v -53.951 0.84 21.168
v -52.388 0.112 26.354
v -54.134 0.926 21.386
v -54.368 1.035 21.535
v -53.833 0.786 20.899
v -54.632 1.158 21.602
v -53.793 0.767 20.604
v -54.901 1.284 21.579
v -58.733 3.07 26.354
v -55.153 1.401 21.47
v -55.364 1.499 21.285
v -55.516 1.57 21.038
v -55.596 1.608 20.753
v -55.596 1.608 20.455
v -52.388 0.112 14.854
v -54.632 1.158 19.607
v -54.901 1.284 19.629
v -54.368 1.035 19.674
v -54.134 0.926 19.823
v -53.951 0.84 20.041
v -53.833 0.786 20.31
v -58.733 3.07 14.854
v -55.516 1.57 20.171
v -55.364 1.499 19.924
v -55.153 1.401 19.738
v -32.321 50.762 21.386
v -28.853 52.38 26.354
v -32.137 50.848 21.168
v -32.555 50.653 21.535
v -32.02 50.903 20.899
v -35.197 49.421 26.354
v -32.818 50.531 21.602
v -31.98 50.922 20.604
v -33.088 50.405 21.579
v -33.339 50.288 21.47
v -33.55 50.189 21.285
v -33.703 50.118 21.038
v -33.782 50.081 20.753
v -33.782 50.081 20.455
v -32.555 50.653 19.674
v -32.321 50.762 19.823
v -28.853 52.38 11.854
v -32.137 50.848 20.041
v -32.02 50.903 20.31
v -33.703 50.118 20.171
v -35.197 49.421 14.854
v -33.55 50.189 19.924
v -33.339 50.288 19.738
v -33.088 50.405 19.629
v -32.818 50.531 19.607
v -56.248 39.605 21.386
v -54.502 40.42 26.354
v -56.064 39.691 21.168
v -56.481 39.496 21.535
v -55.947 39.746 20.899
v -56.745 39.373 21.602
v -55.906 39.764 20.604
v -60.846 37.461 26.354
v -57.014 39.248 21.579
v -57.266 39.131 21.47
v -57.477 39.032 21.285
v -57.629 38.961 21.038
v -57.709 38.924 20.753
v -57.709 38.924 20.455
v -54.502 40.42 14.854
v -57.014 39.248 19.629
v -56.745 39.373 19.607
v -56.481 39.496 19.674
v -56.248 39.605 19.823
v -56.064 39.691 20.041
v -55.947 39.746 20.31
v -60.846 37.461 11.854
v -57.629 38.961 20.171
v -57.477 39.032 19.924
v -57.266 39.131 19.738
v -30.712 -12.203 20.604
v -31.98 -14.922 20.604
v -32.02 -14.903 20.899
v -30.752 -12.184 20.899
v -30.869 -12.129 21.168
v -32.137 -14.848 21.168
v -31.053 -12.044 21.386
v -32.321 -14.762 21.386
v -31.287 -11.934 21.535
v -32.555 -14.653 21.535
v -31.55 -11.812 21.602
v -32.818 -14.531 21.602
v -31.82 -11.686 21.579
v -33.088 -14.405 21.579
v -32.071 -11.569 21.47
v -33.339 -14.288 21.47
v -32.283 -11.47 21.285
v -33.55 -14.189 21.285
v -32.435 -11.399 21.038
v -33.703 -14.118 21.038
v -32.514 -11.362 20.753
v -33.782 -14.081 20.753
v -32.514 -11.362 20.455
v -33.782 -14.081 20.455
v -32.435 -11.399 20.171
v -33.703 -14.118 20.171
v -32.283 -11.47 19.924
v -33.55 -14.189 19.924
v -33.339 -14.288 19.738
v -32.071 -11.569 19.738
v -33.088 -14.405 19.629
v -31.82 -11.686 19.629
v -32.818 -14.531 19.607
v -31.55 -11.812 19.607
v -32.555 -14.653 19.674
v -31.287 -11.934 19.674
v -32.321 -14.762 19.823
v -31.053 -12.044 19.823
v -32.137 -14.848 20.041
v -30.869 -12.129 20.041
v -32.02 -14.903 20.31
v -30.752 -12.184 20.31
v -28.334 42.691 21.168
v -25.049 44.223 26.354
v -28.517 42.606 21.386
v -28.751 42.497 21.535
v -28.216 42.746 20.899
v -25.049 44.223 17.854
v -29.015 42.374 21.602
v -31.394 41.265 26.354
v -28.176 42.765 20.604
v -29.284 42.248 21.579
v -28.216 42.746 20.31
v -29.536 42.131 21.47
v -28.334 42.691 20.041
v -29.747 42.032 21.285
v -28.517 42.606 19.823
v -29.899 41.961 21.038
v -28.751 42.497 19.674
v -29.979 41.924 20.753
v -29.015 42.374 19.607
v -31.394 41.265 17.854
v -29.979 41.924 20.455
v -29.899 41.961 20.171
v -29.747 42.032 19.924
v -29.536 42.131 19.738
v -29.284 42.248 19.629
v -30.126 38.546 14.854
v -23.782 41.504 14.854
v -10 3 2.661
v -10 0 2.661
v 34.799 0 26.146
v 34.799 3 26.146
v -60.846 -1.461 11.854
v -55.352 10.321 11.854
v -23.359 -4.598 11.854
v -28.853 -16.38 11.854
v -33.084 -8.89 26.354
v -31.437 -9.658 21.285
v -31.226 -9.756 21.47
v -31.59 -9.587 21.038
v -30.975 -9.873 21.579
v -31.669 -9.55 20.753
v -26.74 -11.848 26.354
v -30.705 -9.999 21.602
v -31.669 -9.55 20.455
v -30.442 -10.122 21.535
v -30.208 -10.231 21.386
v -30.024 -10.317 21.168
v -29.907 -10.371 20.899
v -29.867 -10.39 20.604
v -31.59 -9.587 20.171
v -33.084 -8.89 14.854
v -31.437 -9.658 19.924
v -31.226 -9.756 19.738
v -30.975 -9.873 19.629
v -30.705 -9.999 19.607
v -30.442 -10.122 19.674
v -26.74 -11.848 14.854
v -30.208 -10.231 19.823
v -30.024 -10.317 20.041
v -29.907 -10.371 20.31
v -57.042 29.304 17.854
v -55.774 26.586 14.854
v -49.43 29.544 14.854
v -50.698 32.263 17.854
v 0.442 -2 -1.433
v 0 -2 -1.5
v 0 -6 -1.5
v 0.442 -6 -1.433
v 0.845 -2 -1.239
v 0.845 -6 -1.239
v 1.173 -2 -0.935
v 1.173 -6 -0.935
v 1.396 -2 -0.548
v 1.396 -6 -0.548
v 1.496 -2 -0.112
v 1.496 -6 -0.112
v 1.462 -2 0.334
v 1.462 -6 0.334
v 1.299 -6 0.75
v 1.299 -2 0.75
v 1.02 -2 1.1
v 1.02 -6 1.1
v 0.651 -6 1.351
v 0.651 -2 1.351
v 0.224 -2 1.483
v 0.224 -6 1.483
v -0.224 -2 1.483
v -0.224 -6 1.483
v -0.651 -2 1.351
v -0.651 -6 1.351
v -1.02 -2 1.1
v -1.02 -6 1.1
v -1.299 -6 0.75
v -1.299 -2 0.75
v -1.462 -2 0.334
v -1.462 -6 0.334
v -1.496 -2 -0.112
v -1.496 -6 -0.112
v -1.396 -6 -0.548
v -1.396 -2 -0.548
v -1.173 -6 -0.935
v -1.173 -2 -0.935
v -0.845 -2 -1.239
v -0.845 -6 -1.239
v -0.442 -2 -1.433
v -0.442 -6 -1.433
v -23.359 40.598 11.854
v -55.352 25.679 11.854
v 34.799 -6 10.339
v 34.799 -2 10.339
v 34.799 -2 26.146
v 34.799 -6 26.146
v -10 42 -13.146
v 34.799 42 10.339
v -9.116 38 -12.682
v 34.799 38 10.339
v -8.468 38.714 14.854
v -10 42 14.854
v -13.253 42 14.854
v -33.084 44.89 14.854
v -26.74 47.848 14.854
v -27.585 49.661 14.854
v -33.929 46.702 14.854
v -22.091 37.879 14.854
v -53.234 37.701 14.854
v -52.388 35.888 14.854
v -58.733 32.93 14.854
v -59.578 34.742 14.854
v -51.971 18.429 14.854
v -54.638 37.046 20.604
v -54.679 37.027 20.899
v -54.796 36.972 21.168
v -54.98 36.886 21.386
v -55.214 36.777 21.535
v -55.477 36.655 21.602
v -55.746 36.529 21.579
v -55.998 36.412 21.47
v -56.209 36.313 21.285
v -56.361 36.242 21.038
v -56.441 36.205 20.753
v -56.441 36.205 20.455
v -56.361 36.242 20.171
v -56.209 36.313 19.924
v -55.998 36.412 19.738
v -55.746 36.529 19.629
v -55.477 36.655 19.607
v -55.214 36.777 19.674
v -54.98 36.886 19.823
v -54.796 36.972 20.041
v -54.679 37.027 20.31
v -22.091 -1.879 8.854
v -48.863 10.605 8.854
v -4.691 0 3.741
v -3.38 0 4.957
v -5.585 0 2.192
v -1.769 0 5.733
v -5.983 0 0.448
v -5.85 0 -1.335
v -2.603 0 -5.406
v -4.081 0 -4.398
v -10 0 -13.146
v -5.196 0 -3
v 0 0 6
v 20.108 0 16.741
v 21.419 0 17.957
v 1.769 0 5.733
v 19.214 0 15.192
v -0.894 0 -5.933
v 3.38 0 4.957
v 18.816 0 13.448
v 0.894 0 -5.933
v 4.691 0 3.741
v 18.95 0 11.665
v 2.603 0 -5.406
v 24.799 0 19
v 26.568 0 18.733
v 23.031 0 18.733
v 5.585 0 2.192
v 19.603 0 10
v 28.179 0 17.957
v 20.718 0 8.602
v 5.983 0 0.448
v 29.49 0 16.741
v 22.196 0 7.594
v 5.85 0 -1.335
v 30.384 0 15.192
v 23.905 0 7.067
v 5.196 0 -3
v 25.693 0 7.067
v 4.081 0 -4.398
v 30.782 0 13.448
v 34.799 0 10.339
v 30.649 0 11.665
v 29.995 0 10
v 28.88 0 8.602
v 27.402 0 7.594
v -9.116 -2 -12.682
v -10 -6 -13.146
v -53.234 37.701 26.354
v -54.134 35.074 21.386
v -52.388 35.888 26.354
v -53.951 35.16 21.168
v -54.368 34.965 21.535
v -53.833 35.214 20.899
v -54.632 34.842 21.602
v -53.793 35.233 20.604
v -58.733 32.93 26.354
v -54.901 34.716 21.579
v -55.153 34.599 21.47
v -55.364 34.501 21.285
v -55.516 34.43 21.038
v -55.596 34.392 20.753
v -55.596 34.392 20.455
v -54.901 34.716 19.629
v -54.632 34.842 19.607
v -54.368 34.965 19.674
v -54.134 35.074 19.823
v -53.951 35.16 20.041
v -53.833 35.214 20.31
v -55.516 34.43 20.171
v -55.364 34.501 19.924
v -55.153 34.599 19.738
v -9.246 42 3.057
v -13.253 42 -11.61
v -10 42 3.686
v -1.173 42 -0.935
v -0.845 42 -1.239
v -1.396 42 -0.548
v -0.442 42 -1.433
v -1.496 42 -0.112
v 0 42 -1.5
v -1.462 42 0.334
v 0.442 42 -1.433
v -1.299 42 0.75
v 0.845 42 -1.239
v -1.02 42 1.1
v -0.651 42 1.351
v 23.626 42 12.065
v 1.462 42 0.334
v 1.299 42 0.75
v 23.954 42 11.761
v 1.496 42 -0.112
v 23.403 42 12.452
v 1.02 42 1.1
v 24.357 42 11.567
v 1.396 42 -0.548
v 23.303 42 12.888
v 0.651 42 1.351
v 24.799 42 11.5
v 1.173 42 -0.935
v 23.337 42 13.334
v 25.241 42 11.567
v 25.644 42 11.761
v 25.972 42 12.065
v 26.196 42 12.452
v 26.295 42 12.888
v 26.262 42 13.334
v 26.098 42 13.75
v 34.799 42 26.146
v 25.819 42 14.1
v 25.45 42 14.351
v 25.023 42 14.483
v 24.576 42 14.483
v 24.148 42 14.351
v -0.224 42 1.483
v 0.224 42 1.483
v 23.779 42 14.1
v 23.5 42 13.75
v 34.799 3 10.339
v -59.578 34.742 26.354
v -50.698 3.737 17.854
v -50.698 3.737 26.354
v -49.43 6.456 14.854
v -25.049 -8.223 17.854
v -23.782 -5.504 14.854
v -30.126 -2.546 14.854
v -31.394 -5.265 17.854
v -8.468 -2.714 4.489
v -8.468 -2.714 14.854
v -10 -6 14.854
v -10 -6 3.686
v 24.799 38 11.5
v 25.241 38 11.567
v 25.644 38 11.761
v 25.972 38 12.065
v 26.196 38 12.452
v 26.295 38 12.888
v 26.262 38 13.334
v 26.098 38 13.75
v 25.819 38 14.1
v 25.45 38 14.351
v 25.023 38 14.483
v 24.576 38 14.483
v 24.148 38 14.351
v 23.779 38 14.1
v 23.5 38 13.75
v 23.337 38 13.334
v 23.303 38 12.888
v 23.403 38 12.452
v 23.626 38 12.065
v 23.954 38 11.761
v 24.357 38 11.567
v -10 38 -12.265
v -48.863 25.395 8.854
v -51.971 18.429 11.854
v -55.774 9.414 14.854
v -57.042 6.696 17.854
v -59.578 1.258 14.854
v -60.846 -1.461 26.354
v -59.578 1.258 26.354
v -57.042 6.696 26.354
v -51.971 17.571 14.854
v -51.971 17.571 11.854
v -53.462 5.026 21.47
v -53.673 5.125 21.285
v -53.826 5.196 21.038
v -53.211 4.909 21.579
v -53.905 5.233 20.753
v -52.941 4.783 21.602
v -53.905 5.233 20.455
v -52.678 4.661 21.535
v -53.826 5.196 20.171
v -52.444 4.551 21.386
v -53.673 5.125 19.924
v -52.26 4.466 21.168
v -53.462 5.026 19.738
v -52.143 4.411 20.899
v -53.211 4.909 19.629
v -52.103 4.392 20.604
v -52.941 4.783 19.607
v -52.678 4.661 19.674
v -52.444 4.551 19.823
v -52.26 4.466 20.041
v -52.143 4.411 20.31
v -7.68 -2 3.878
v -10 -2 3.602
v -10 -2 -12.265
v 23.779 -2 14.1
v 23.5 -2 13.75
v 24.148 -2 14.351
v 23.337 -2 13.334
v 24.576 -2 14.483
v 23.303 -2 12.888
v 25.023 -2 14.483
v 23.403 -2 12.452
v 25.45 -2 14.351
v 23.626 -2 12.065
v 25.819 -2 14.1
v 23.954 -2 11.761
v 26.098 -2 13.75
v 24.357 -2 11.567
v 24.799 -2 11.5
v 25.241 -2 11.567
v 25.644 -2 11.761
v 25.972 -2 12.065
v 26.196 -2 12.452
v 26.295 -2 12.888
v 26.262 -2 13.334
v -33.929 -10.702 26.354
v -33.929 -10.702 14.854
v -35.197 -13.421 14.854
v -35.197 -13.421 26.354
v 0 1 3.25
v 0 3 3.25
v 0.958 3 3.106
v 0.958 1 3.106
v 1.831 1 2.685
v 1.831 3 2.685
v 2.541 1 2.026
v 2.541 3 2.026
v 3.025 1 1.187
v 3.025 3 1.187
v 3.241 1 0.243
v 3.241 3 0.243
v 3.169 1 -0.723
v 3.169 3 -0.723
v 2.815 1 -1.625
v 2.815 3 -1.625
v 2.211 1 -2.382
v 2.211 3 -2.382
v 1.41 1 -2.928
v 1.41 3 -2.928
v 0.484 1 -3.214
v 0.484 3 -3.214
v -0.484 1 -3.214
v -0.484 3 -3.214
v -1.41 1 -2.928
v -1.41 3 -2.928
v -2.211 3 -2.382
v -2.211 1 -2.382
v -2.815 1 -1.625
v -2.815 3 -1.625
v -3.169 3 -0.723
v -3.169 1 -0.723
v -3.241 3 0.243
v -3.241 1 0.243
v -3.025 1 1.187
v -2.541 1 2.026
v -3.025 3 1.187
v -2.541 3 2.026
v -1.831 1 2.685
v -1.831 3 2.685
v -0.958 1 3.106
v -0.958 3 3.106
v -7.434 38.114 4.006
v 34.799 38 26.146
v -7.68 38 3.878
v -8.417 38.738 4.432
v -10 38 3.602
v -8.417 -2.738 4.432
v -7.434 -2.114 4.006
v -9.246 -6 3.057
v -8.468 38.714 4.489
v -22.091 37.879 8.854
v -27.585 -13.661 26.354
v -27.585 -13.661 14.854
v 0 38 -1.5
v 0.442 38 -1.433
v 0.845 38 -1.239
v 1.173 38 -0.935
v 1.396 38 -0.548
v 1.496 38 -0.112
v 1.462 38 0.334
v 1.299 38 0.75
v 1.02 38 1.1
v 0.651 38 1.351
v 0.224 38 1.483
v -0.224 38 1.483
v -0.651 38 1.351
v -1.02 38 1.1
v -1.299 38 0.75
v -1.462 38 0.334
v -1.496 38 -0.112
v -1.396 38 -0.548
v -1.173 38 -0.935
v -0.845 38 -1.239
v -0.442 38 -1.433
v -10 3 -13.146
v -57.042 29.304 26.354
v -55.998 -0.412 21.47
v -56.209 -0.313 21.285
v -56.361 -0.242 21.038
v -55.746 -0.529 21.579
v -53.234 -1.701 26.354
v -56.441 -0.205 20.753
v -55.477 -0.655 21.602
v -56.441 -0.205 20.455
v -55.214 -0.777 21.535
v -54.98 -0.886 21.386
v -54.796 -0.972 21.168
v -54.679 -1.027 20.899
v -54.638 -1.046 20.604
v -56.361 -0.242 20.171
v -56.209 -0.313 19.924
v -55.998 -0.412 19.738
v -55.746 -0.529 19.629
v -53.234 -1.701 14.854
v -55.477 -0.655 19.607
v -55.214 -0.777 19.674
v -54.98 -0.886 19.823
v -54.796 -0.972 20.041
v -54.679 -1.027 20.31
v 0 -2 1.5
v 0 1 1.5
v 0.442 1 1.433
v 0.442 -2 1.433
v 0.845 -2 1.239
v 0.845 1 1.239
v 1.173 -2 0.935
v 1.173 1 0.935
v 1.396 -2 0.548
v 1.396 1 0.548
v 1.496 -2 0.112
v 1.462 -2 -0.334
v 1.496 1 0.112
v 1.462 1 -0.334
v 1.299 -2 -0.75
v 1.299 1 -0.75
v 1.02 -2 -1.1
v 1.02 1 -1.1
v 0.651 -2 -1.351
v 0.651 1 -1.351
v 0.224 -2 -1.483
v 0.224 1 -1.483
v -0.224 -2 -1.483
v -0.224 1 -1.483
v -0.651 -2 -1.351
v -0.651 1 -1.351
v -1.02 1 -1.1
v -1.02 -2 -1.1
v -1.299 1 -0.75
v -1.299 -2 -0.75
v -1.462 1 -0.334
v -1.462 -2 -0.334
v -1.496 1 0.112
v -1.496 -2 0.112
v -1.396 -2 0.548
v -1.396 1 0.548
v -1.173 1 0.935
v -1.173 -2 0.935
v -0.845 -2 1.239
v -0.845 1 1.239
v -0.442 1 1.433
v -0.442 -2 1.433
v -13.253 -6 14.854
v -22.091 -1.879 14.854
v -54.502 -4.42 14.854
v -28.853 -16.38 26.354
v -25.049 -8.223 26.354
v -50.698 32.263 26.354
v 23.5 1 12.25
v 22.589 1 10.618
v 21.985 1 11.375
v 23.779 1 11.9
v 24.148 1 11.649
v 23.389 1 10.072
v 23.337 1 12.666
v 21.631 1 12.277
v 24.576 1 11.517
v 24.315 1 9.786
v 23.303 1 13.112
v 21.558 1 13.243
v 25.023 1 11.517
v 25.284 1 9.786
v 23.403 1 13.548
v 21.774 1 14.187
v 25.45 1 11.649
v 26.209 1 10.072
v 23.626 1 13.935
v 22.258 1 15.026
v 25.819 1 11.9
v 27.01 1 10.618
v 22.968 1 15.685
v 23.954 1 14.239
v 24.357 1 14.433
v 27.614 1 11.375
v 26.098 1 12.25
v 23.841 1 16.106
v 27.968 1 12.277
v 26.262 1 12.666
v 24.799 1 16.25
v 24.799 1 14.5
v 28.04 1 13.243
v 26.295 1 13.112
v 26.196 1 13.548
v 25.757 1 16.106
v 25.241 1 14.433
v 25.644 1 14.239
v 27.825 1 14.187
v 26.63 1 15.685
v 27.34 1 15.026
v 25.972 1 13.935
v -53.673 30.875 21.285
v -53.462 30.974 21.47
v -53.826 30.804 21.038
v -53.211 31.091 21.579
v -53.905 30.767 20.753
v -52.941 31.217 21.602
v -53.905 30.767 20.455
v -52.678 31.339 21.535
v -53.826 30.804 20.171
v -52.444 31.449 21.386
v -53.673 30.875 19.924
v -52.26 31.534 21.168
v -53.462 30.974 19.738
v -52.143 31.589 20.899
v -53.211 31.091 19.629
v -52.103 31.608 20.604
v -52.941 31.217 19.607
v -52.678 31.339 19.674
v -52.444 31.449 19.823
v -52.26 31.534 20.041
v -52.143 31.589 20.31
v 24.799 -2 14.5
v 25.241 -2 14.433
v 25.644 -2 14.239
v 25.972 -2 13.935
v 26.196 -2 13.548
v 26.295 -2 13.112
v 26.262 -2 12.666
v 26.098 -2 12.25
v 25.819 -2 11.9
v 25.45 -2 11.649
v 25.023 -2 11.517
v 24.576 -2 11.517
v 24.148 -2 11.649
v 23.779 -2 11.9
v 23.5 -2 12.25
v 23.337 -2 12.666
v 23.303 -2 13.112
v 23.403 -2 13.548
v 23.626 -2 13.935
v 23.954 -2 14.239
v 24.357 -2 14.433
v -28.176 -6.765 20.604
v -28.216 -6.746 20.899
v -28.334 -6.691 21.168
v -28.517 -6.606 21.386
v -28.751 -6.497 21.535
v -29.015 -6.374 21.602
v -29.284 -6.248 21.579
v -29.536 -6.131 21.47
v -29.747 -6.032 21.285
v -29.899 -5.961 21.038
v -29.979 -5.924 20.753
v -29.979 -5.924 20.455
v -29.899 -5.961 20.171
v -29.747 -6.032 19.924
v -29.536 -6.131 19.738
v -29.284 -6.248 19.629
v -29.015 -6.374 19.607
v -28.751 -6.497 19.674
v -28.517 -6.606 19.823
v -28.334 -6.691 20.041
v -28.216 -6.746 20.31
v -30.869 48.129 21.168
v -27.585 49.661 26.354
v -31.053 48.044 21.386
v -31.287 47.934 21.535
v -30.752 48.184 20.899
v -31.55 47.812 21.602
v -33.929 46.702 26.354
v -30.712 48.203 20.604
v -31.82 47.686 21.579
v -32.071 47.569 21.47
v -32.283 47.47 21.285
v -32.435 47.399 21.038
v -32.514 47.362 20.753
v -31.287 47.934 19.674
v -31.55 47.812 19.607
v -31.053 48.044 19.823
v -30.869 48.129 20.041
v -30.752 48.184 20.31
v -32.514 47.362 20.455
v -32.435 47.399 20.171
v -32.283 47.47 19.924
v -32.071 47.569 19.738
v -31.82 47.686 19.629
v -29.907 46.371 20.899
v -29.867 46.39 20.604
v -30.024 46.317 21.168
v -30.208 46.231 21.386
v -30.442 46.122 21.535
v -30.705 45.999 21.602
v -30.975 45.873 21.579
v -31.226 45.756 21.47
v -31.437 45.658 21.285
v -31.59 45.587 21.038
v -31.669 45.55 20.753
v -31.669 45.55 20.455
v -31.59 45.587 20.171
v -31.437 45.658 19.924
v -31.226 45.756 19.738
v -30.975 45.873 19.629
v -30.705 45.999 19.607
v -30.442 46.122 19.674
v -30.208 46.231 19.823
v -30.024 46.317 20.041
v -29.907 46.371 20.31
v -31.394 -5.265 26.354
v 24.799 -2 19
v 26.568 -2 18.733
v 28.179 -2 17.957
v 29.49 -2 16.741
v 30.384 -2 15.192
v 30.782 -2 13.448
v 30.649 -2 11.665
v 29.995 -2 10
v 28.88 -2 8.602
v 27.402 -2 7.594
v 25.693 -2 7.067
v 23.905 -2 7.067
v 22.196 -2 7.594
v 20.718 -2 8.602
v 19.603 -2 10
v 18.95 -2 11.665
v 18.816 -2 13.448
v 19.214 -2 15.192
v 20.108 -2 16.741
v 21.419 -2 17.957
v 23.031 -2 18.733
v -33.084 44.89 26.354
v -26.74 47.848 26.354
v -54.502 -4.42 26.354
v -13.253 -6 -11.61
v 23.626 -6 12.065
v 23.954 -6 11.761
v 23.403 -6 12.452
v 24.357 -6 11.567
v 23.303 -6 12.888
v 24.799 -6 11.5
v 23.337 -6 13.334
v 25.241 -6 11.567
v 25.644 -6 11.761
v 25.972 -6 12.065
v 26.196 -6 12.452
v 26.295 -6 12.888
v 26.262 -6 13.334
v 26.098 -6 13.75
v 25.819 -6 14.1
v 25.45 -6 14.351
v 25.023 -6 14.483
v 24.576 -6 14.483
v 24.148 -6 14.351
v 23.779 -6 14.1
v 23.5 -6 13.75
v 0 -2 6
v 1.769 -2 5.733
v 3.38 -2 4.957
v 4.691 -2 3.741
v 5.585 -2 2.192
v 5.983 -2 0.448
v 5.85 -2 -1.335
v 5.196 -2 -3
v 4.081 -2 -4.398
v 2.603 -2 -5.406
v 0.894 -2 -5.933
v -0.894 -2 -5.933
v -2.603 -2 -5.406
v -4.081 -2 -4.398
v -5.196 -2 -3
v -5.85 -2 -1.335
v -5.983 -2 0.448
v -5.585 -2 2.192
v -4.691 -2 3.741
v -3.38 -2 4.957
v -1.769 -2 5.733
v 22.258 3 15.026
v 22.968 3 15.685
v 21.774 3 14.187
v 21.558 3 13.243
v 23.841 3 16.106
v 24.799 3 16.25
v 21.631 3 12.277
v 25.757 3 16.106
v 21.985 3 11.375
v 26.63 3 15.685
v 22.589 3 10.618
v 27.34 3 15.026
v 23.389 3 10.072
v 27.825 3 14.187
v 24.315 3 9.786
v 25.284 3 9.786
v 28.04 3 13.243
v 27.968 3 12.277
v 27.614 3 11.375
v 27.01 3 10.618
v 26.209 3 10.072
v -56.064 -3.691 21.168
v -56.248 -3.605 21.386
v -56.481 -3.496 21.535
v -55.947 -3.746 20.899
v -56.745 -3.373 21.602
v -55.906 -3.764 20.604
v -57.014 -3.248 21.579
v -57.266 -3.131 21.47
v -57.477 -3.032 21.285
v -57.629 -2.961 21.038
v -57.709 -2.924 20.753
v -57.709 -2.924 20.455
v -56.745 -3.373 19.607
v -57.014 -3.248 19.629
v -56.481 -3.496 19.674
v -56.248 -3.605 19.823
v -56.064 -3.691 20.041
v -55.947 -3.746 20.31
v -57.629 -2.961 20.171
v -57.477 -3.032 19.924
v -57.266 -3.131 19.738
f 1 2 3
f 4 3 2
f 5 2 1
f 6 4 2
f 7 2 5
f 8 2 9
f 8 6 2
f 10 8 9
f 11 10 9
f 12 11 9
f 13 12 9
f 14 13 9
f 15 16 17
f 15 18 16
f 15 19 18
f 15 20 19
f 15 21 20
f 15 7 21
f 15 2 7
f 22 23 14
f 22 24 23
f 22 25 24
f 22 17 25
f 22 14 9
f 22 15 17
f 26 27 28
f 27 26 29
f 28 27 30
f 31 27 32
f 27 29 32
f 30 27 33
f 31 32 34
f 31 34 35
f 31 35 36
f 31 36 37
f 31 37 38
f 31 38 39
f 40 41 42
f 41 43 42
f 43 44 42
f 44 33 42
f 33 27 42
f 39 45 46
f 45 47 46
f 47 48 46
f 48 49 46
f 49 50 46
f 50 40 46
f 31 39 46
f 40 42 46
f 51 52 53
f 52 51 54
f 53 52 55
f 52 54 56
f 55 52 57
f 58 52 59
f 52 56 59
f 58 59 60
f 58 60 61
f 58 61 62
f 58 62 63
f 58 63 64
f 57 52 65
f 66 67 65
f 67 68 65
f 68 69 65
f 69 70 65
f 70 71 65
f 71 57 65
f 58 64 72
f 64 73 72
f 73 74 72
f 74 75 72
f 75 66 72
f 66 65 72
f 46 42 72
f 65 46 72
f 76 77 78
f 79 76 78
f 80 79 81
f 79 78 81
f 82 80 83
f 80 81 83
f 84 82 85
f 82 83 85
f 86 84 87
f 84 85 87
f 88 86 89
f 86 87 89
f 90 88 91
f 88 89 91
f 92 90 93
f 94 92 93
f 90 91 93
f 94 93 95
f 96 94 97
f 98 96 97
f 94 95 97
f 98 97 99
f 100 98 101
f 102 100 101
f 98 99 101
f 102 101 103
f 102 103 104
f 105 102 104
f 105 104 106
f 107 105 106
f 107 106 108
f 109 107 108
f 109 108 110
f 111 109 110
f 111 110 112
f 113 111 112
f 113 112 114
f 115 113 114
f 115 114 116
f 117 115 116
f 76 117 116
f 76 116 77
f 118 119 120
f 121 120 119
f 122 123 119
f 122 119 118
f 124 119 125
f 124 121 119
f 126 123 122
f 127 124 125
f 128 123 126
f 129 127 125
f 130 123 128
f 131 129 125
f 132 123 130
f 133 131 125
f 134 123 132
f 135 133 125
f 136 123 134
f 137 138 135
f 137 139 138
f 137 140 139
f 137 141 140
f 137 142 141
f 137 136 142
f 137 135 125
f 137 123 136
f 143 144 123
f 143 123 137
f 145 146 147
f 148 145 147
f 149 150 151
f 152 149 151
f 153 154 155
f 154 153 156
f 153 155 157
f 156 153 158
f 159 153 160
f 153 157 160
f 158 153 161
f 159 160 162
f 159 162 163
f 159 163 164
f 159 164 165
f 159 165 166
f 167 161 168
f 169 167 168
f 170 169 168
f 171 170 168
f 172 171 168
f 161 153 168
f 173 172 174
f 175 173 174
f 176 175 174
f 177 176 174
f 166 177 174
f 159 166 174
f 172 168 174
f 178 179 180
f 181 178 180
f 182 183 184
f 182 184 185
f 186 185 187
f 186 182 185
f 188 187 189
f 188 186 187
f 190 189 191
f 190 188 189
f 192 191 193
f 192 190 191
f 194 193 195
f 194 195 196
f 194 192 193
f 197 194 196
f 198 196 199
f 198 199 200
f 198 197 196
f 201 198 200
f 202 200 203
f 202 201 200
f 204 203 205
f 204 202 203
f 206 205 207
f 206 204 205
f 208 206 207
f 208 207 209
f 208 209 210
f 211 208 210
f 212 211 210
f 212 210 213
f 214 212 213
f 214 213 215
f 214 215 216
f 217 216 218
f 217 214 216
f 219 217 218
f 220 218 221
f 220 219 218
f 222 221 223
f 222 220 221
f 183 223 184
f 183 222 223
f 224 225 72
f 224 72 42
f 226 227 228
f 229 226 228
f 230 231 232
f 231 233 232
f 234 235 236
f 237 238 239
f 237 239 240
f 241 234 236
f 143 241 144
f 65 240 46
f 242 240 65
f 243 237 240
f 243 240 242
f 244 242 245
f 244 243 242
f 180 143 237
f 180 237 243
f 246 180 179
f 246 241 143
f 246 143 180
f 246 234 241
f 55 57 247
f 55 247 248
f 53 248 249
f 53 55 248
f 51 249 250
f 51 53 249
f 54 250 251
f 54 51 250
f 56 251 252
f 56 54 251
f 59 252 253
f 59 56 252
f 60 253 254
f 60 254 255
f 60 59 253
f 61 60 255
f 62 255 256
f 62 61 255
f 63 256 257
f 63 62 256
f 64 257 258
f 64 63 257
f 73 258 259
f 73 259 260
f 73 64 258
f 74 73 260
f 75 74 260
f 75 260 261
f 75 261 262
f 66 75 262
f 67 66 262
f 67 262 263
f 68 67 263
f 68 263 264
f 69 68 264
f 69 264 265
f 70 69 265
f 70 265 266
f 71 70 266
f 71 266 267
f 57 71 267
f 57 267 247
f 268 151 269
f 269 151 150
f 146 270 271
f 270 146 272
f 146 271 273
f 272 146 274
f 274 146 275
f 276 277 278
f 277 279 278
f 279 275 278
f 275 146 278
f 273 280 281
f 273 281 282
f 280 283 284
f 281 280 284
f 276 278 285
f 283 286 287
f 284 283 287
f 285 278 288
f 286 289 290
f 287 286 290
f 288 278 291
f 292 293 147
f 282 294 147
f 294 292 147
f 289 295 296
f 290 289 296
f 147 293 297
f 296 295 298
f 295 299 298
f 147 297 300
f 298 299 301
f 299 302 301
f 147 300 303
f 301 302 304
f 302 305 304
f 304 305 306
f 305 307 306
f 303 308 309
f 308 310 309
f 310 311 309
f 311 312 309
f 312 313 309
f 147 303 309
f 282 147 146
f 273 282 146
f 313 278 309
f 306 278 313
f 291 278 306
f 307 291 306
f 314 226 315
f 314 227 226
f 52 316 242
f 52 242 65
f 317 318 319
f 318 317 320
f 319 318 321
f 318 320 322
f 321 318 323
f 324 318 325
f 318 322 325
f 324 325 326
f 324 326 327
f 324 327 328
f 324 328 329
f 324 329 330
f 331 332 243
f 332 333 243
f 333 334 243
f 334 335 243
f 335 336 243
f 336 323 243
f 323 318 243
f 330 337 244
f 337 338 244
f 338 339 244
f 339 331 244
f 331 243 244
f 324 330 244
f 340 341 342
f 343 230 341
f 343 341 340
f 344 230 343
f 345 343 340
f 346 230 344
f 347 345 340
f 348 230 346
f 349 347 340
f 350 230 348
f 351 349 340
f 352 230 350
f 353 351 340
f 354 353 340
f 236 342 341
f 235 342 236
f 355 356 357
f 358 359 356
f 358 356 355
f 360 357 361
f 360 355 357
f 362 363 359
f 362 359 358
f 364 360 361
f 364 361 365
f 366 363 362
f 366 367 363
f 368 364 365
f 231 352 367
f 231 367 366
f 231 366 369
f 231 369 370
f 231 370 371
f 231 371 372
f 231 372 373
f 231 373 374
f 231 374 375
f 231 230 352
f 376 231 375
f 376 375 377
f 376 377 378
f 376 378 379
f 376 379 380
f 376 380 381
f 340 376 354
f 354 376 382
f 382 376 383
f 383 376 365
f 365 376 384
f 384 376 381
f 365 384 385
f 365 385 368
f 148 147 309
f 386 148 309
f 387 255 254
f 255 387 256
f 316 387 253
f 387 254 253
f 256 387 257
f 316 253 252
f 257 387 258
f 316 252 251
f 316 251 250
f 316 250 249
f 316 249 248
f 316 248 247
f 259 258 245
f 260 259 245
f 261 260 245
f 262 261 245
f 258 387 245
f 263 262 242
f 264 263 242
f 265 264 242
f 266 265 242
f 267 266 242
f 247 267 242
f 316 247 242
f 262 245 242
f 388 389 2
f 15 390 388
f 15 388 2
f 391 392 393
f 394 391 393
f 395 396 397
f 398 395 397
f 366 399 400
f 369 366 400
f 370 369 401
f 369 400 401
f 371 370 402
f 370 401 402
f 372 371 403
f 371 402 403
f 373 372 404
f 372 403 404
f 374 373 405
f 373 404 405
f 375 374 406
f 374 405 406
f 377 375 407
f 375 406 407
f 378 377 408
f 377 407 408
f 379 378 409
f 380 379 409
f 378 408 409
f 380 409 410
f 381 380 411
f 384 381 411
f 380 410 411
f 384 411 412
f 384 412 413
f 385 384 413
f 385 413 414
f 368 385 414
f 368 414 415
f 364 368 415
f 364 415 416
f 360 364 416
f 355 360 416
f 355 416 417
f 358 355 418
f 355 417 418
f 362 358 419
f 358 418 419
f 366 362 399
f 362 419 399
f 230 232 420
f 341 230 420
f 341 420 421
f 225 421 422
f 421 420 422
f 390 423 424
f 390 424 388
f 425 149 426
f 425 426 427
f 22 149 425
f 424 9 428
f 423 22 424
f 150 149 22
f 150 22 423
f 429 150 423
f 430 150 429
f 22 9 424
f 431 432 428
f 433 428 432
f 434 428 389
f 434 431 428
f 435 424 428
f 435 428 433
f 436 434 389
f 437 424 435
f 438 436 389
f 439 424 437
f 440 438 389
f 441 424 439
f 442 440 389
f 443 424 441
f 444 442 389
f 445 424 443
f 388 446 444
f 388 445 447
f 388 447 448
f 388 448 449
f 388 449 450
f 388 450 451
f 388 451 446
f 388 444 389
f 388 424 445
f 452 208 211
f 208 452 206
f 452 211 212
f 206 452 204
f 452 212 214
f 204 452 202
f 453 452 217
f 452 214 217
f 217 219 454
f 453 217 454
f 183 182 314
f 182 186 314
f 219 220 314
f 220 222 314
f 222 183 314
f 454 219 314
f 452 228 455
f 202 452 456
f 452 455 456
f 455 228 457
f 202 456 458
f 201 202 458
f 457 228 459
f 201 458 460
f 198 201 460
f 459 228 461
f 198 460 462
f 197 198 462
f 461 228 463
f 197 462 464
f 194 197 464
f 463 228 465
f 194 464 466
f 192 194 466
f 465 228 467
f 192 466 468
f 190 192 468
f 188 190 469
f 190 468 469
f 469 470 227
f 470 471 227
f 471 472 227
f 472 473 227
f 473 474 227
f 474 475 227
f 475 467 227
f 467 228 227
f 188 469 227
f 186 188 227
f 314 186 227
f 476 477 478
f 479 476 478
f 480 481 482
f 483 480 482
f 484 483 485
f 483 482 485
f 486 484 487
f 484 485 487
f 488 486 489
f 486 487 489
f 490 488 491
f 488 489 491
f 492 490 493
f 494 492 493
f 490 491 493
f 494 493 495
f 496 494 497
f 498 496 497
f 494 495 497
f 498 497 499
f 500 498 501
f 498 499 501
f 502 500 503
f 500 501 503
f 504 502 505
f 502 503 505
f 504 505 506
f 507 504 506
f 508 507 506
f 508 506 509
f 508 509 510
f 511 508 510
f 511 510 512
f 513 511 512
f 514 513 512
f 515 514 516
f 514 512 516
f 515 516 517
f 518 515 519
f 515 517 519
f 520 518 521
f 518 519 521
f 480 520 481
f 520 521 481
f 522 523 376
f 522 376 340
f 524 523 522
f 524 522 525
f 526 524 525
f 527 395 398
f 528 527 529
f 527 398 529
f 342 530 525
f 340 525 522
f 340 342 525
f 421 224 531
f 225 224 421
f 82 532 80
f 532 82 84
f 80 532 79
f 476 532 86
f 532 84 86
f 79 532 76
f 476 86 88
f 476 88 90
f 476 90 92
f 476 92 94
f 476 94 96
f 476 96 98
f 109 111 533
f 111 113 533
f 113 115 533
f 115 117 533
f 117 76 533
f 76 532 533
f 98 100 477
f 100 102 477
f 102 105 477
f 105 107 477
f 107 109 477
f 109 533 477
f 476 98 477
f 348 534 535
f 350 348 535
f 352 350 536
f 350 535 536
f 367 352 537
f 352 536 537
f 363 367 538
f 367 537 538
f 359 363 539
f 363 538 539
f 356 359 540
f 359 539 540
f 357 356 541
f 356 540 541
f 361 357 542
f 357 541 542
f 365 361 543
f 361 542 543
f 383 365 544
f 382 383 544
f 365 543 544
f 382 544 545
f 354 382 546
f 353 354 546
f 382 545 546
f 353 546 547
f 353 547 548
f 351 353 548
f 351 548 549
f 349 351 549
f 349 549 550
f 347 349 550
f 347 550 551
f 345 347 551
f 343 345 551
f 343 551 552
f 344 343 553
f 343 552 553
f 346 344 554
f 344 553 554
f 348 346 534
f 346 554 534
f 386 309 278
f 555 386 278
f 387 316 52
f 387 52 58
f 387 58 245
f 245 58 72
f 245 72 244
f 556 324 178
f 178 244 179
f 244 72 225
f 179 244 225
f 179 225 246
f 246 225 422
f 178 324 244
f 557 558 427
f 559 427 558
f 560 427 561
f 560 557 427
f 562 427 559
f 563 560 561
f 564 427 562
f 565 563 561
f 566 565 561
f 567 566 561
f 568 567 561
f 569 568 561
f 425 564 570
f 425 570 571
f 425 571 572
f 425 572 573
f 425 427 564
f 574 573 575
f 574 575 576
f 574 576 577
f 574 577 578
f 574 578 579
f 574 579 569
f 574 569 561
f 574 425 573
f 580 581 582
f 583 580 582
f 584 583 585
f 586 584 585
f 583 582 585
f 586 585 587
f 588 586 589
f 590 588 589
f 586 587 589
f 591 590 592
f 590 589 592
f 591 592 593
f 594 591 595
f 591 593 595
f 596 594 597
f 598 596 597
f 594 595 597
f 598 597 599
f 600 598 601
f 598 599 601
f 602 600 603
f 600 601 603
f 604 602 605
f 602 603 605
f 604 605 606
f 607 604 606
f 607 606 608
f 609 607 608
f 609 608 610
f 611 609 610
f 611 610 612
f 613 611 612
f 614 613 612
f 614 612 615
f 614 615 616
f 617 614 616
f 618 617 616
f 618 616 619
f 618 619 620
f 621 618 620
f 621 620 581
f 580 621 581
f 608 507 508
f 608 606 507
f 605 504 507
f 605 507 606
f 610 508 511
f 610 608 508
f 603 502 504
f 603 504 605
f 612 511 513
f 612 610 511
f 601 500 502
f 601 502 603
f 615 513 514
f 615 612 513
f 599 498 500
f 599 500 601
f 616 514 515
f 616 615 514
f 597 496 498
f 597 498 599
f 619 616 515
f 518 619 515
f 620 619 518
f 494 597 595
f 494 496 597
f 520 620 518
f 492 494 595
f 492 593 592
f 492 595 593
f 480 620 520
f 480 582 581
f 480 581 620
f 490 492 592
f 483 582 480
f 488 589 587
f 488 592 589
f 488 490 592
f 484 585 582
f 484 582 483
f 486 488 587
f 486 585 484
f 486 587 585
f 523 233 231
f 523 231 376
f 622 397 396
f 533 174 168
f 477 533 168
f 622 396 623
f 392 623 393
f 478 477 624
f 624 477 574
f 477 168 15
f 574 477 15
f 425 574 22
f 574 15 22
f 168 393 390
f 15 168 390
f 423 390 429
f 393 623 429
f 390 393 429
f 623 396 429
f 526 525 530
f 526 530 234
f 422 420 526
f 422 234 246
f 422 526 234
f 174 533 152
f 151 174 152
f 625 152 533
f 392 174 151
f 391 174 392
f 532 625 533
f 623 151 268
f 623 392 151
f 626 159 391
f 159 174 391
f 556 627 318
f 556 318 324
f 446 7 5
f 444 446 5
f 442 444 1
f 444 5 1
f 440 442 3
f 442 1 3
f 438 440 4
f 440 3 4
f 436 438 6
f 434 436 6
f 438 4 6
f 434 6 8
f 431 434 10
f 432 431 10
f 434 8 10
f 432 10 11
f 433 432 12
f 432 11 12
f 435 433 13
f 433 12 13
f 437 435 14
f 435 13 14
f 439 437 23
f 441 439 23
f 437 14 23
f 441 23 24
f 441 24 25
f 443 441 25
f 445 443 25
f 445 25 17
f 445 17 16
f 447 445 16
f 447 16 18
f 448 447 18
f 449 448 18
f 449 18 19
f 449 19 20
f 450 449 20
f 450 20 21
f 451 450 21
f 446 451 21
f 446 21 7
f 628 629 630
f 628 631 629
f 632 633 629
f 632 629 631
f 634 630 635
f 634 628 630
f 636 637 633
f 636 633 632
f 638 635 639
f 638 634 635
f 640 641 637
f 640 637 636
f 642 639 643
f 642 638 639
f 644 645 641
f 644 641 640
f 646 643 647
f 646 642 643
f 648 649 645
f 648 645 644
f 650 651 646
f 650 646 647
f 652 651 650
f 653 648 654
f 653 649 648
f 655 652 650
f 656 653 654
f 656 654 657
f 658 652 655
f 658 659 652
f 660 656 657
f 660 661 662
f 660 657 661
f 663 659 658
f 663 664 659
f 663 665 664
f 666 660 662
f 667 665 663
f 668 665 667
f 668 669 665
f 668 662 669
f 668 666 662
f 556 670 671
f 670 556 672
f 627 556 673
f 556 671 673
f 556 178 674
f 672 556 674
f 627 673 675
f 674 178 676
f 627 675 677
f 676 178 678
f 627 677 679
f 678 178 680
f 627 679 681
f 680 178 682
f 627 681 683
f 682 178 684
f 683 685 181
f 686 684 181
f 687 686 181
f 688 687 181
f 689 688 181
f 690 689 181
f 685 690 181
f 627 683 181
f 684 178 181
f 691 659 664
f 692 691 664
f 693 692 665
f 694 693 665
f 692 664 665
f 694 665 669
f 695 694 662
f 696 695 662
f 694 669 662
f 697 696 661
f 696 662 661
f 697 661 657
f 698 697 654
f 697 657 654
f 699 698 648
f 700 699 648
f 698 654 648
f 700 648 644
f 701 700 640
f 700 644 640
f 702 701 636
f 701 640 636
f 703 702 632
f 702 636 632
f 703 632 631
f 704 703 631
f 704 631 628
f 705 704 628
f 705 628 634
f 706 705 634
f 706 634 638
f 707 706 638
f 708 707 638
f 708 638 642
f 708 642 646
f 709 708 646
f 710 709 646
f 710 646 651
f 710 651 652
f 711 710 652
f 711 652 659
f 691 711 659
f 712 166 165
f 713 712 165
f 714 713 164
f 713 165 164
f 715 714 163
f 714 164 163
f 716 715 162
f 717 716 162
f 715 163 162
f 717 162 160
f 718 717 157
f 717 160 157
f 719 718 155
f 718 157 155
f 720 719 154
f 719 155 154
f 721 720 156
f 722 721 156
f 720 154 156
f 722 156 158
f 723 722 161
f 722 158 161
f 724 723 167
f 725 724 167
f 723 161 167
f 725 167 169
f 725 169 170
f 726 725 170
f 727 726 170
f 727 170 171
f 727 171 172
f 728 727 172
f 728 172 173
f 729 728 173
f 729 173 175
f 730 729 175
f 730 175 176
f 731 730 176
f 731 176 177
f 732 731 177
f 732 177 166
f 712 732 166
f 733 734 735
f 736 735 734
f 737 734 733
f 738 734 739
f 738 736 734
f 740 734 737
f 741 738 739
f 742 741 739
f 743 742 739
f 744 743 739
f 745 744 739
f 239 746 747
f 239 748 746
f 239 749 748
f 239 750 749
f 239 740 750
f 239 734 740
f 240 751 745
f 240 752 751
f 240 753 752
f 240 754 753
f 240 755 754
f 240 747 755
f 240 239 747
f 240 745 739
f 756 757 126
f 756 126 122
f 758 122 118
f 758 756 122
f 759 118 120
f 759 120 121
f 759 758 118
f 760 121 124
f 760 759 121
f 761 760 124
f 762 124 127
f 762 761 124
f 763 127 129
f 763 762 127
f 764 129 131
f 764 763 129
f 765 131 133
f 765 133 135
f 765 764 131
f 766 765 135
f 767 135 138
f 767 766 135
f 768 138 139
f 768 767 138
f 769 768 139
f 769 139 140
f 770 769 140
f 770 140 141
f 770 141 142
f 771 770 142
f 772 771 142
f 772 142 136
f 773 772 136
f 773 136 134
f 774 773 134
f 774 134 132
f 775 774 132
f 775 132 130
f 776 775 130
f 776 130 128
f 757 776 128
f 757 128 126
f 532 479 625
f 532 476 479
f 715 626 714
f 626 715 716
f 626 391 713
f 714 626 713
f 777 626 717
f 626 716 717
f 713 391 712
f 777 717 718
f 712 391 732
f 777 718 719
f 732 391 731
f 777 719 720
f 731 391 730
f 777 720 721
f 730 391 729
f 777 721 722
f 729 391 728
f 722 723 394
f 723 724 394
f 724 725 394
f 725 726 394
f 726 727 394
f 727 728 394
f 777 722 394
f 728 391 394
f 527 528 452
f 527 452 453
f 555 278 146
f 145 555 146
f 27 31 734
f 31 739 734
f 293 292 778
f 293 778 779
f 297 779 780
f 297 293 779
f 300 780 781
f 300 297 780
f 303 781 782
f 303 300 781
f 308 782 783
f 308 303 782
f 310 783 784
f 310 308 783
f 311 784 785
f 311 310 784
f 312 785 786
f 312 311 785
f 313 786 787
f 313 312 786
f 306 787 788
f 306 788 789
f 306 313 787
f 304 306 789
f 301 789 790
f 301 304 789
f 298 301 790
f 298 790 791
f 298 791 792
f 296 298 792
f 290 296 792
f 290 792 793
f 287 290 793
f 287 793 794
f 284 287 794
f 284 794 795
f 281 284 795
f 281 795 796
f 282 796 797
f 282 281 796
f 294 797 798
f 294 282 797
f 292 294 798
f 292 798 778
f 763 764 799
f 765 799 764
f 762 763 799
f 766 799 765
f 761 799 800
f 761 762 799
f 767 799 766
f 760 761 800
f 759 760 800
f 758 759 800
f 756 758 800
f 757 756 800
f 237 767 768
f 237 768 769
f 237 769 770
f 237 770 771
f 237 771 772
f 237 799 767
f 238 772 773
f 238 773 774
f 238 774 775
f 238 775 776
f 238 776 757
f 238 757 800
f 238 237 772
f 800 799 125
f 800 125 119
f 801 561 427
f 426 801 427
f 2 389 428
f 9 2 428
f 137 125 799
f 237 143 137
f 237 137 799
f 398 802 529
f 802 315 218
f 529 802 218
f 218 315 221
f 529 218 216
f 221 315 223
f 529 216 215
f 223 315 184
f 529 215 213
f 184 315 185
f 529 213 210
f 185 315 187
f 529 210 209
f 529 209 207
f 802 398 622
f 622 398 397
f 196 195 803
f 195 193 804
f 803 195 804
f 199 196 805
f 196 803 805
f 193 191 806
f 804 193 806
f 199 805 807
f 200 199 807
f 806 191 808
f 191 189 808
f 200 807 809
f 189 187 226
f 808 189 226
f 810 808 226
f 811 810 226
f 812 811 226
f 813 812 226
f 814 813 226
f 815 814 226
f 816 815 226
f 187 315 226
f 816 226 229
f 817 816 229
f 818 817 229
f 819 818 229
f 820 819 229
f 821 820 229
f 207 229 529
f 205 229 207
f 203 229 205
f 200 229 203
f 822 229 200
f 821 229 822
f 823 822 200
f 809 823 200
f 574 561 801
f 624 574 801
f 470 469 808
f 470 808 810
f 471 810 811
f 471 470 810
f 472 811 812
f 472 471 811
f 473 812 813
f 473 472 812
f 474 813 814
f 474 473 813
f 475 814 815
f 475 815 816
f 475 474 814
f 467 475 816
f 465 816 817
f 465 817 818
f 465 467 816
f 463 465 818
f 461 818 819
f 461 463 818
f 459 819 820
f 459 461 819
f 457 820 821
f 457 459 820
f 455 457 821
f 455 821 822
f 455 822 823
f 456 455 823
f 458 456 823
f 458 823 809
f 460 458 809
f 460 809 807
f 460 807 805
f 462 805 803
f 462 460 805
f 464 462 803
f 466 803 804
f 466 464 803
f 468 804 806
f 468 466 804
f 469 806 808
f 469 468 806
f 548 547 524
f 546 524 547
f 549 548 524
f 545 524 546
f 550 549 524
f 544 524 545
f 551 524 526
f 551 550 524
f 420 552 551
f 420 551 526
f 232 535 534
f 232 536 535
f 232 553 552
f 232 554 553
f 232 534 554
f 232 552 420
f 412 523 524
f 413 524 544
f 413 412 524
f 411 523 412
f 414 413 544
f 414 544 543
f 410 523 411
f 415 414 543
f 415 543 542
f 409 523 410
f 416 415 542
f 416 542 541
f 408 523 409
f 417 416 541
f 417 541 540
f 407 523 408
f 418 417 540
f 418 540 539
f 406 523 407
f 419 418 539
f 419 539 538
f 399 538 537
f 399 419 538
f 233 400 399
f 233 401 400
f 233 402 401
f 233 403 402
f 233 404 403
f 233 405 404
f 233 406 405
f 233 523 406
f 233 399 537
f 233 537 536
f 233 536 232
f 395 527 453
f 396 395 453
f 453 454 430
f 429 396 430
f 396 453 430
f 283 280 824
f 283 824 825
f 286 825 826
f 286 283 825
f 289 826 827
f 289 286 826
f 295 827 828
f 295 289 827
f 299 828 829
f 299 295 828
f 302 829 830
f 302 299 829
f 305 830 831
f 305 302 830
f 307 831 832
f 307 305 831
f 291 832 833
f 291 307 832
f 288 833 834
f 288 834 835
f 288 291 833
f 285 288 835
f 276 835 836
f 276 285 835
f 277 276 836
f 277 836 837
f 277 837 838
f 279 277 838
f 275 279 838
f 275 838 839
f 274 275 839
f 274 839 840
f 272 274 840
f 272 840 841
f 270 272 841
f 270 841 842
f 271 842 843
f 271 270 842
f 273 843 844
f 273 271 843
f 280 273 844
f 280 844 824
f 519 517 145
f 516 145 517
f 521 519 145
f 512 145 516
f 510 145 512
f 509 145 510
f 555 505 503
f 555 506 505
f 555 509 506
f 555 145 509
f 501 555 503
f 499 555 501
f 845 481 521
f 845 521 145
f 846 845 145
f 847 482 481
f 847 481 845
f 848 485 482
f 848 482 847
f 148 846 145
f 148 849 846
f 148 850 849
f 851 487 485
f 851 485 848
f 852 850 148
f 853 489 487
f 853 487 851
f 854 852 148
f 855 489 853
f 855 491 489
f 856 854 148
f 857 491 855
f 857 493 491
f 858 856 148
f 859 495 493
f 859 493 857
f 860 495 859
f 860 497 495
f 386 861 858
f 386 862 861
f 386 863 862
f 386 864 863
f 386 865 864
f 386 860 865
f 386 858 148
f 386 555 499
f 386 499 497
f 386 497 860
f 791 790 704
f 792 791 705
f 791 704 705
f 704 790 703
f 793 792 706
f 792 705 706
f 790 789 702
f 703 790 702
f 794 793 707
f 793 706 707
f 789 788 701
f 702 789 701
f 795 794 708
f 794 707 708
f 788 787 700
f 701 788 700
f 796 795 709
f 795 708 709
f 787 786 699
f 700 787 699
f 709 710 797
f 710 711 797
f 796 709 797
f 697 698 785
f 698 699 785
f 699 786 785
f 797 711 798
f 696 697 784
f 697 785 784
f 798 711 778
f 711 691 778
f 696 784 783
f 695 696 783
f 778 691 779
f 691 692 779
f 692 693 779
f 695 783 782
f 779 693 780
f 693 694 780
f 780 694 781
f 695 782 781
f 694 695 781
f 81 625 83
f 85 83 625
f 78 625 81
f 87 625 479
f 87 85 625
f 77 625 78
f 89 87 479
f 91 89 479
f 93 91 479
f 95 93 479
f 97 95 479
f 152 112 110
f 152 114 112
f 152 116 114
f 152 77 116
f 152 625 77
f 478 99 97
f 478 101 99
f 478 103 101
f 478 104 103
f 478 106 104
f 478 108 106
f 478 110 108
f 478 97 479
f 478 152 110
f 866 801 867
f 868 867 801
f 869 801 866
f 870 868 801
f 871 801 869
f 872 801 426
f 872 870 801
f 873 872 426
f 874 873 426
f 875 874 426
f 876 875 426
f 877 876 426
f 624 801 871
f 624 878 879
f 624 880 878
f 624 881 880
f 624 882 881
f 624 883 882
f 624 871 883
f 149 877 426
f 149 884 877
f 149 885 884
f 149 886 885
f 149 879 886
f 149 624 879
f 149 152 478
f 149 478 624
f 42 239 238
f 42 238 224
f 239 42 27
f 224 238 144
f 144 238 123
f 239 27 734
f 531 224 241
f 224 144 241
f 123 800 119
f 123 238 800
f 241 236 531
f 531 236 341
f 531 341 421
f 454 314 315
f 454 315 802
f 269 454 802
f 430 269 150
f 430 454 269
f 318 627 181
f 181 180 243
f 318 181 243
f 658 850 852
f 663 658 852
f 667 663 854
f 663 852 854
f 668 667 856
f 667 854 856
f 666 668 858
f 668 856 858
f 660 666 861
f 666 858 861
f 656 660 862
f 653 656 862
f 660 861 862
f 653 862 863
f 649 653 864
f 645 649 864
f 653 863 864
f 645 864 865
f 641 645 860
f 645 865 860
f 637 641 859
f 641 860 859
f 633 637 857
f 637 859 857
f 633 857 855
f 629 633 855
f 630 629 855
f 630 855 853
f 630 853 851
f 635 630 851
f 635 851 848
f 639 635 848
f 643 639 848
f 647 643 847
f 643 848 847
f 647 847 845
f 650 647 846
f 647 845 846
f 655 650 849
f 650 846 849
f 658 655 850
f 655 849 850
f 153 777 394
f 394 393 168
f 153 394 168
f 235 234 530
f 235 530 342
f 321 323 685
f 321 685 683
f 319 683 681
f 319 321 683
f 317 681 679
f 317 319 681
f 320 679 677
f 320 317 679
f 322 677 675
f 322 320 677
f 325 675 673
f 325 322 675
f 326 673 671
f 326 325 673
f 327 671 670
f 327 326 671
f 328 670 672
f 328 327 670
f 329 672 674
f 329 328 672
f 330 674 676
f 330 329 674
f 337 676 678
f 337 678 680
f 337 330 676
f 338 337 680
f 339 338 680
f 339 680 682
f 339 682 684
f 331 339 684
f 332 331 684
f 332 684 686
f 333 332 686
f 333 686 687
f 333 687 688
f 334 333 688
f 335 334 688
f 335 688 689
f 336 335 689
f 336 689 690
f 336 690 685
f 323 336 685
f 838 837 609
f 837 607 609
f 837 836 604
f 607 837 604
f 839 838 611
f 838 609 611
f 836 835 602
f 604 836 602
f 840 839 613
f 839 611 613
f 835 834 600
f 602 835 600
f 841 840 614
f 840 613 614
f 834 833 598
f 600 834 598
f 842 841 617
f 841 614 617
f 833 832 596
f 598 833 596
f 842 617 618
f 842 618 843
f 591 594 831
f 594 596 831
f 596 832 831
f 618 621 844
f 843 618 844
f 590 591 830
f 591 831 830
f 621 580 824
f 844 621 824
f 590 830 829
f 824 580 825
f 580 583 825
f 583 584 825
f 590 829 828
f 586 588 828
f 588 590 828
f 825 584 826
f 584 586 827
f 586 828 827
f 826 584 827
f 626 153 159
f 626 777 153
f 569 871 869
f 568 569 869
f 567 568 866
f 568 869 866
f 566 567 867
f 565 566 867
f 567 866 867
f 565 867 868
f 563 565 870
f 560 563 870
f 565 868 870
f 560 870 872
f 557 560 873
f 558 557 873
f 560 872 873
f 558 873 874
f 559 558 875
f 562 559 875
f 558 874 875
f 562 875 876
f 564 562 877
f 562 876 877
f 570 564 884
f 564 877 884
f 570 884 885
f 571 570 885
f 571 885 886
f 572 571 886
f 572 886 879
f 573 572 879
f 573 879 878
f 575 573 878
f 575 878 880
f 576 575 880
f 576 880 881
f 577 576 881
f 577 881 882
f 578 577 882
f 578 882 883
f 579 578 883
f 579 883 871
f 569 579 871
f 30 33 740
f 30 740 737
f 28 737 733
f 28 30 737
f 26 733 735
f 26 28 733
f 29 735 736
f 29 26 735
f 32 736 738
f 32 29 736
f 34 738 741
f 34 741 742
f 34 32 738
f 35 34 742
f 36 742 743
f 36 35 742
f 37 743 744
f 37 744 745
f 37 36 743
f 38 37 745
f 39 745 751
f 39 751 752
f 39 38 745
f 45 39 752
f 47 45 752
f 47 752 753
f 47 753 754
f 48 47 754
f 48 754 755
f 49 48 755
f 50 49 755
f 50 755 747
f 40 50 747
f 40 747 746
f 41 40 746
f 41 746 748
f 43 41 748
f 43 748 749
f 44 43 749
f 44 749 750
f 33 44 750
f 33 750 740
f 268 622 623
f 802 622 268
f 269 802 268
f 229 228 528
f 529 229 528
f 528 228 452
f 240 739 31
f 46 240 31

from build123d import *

# Parameters (mm, degrees)
BOSS_EXTRUDE1_DEPTH  = 3
SKETCH1_R            = 6
SKETCH1_R_2          = 5.999999999999998
BOSS_EXTRUDE3_DEPTH  = 2
SKETCH4_R            = 1.5000000000000013
SKETCH4_R_2          = 1.5000000000000009
CUT_EXTRUDE1_DEPTH   = 44.812962496801305
SKETCH5_R            = 3.25
SKETCH5_R_2          = 3.2500000000000004
CUT_EXTRUDE2_DEPTH   = 2
SKETCH6_R            = 1.5000000000000013
SKETCH6_R_2          = 1.5000000000000009
BOSS_EXTRUDE4_DEPTH  = 4
BOSS_EXTRUDE9_DEPTH  = 5
BOSS_EXTRUDE10_DEPTH = 3
BOSS_EXTRUDE11_DEPTH = 11.5
SKETCH24_R           = 0.9999999999999983
CUT_EXTRUDE3_DEPTH   = 71.05142175706676
CUT_EXTRUDE4_DEPTH   = 71.37296543116399
CUT_EXTRUDE5_DEPTH   = 75.00527115702536
CHAMFER2_SIZE        = 1
CHAMFER2_SIZE_2      = 0.849779112
CHAMFER2_SIZE_3      = 0.753042781
CHAMFER3_SIZE        = 48
CHAMFER3_SIZE_2      = 25
CHAMFER4_SIZE        = 3
CHAMFER5_SIZE        = 3


with BuildPart() as part:
    # Sketch3 → Boss-Extrude1 (new body)
    with BuildSketch(Plane(origin=(0, 0, 0), x_dir=(1, 0, 0), z_dir=(0, 1, 0))):
        Polygon((-10, 13.145588768291844), (-9.999999999999998, -2.66137686720019), (34.79919353527449, -26.14558876829183), (34.79919353527449, -10.33862313279981), align=None)
    extrude(amount=BOSS_EXTRUDE1_DEPTH)

    # Sketch1 → Boss-Extrude3 (add)
    with BuildSketch(Plane(origin=(0, 0, 0), x_dir=(1, 0, 0), z_dir=(0, 1, 0))):
        with Locations(Location((0, 0, 0), (0, 0, 270))):
            Circle(SKETCH1_R)
        with Locations(Location((24.79919353527449, -13.000000000000002, 0), (0, 0, 270))):
            Circle(SKETCH1_R_2)
    extrude(amount=-BOSS_EXTRUDE3_DEPTH)

    # Sketch4 → Cut-Extrude1 (cut, through all)
    with BuildSketch(Plane(origin=(0, 3, 0), x_dir=(1, 0, 0), z_dir=(0, 1, 0))):
        with Locations(Location((0, 0, 0), (0, 0, 270))):
            Circle(SKETCH4_R)
        with Locations(Location((24.79919353527449, -13.000000000000002, 0), (0, 0, 270))):
            Circle(SKETCH4_R_2)
    extrude(amount=-CUT_EXTRUDE1_DEPTH, mode=Mode.SUBTRACT)

    # Sketch5 → Cut-Extrude2 (cut)
    with BuildSketch(Plane(origin=(0, 3, 0), x_dir=(1, 0, 0), z_dir=(0, 1, 0))):
        with Locations(Location((0, 0, 0), (0, 0, 270))):
            Circle(SKETCH5_R)
        with Locations(Location((24.79919353527449, -13.000000000000002, 0), (0, 0, 270))):
            Circle(SKETCH5_R_2)
    extrude(amount=-CUT_EXTRUDE2_DEPTH, mode=Mode.SUBTRACT)


with BuildPart() as body_2:
    # Sketch6 → Boss-Extrude4 (new body)
    with BuildSketch(Plane.XZ.offset(2)):
        Polygon((-9.999999999999998, 2.66137686720019), (-10, -13.145588768291844), (34.79919353527449, 10.33862313279981), (34.79919353527449, 26.14558876829183), align=None)
        with Locations(Location((0, 0, 0), (0, 0, 270))):
            Circle(SKETCH6_R, mode=Mode.SUBTRACT)
        with Locations(Location((24.79919353527449, 13.000000000000002, 0), (0, 0, 270))):
            Circle(SKETCH6_R_2, mode=Mode.SUBTRACT)
    extrude(amount=BOSS_EXTRUDE4_DEPTH)

    # Sketch19 → Boss-Extrude9 (add)
    with BuildSketch(Plane(origin=(-2.5521063946862226, -5.473009825281398, 2.8e-16), x_dir=(0.9063077870366528, -0.42261826174069356, 0), z_dir=(0.42261826174069356, 0.9063077870366528, 0))):
        Polygon((-6.527368299922367, 13.145588768291844), (-6.5273682999223634, -14.854411231708156), (-54.52736829992237, -14.854411231708161), (-54.52736829992237, 13.145588768291844), align=None)
    extrude(amount=-BOSS_EXTRUDE9_DEPTH)

    # Sketch22 → Boss-Extrude10 (add)
    with BuildSketch(Plane.XY.offset(14.854411231708154)):
        Polygon((-51.9706848915214, 17.571251782926392), (-60.84566838807596, -1.4612117448433186), (-28.85300350568211, -16.379636384289785), (-19.97802000912756, 2.652827143479914), align=None)
    extrude(amount=-BOSS_EXTRUDE10_DEPTH)

    # Sketch23 → Boss-Extrude11 (add)
    with BuildSketch(Plane.XY.offset(14.854411231708154)):
        Polygon((-58.73257707937249, 3.0703271903399454), (-57.04210403240972, 6.695558338486558), (-50.697949523153156, 3.737230506301715), (-52.38842257011593, 0.11199935815509857), align=None)
        Polygon((-60.84566838807596, -1.4612117448433186), (-59.57781360285388, 1.2577116162666404), (-53.23365909359731, -1.7006162159182072), (-54.501513878819395, -4.419539577028165), align=None)
        Polygon((-35.19715801493865, -13.421308552104925), (-28.85300350568211, -16.379636384289785), (-27.58514872046003, -13.6607130231798), (-33.92930322971659, -10.702385190994963), align=None)
        Polygon((-33.0840667062352, -8.88976961692166), (-26.73991219697864, -11.8480974491065), (-25.049439150015868, -8.222866300959888), (-31.393593659272426, -5.264538468775042), align=None)
    extrude(amount=BOSS_EXTRUDE11_DEPTH)

    # Sketch24 → Cut-Extrude3 (cut, through all)
    with BuildSketch(Plane(origin=(-11.42708989124078, -24.505473353051112, 0), x_dir=(0.9063077870366529, -0.4226182617406931, 0), z_dir=(-0.42261826174069306, -0.9063077870366528, 0))):
        with Locations((-50.077368299922384, 20.604411231708156)):
            Circle(SKETCH24_R)
        with Locations((-23.677368299922374, 20.60441123170816)):
            Circle(SKETCH24_R)
    extrude(amount=-CUT_EXTRUDE3_DEPTH, mode=Mode.SUBTRACT)

    # Sketch25 → Cut-Extrude4 (cut, through all)
    with BuildSketch(Plane.XZ.offset(5.999999999999999)):
        Polygon((-1.7598045547698953, -8.82599101058171), (-0.856014781659975, -22.343448840083095), (-19.416391366852192, -22.343448840083095), (-12.561706832548245, 28.592130084052375), (-0.856014781659975, 28.592130084052375), align=None)
    extrude(amount=CUT_EXTRUDE4_DEPTH, mode=Mode.SUBTRACT)

    # Sketch26 → Cut-Extrude5 (cut, through all)
    with BuildSketch(Plane(origin=(3.2500000000000018, 0, -6.1997983838186235), x_dir=(-0.8856854834026603, 0, -0.46428571428571436), z_dir=(0.4642857142857144, 0, -0.8856854834026604))):
        Polygon((-2.6471574670381415, -3.4708885976233637), (-2.0453444794839015, -11.294457435868079), (36.03300455139902, -14.522363460038978), (23.996744800257375, 7.088193820427202), align=None)
    extrude(amount=CUT_EXTRUDE5_DEPTH, mode=Mode.SUBTRACT)

    # Chamfer2
    # the kernel refuses this chamfer: 1, 0.849779112, 0.753042781 mm, written as the material it adds along each edge
    with BuildSketch(Plane(origin=(-6.36268787947312, -3.696106496901656, 4.568094418300827), x_dir=(0.33809036708449836, 0.9242749779914556, 0.17723055251158967), z_dir=(-0.8186169306793458, 0.38172734387111207, -0.4291276683531757))) as chamfer2_piece_1_section:
        Polygon((CHAMFER2_SIZE, -2e-17), (CHAMFER2_SIZE_2 * 0.196215621581, -CHAMFER2_SIZE_2 * 0.980560773459), (0, 0), align=None)
    chamfer2_piece_1 = extrude(amount=7.014923756891123, mode=Mode.PRIVATE)
    chamfer2_piece_1 = split(chamfer2_piece_1, bisect_by=Plane(origin=(-6.36268787947312, -2, 4.568094418300827), z_dir=(0, -1, 0)), keep=Keep.TOP, mode=Mode.PRIVATE)
    chamfer2_piece_1 = split(chamfer2_piece_1, bisect_by=Plane(origin=(-8.46791111376206, -2.714424780626905, 4.568094418300827), z_dir=(-0.9063077870366527, 0.4226182617406935, 0)), keep=Keep.TOP, mode=Mode.PRIVATE)
    add(chamfer2_piece_1)
    with BuildSketch(Plane(origin=(-11.061112191786581, -8.275562438723423, 2.1051306137240746), x_dir=(-0.09141088767312612, -0.19603128122495278, 0.9763277044087783), z_dir=(0.4126139173265195, 0.884853401205295, 0.21629658712953703))) as chamfer2_piece_2_section:
        Polygon((CHAMFER2_SIZE, 0), (CHAMFER2_SIZE_3 * 0.420785758249, CHAMFER2_SIZE_3 * 0.907160044076), (0, 0), align=None)
    chamfer2_piece_2 = extrude(amount=8.85649542189165, mode=Mode.PRIVATE)
    chamfer2_piece_2 = split(chamfer2_piece_2, bisect_by=Plane(origin=(-11.061112191786581, -6, 2.1051306137240746), z_dir=(0, 1, 0)), keep=Keep.TOP, mode=Mode.PRIVATE)
    chamfer2_piece_2 = split(chamfer2_piece_2, bisect_by=Plane(origin=(-8.467911113762062, -2.7144247806268984, 2.105130613724074), z_dir=(-0.42261826174069356, -0.9063077870366528, 0)), keep=Keep.TOP, mode=Mode.PRIVATE)
    add(chamfer2_piece_2)
    with BuildSketch(Plane(origin=(-11.061112191786581, -8.275562438723423, 2.1051306137240746), x_dir=(-0.09141088767312612, -0.19603128122495278, 0.9763277044087783), z_dir=(0.4126139173265195, 0.884853401205295, 0.21629658712953703))) as chamfer2_piece_3a_section:
        Polygon((CHAMFER2_SIZE, 0), (CHAMFER2_SIZE_3 * 0.420785758249, CHAMFER2_SIZE_3 * 0.907160044076), (0, 0), align=None)
    chamfer2_piece_3a = extrude(amount=8.85649542189165, mode=Mode.PRIVATE)
    chamfer2_piece_3a = split(chamfer2_piece_3a, bisect_by=Plane(origin=(-11.061112191786581, -2, 2.1051306137240746), z_dir=(0, -1, 0)), keep=Keep.TOP, mode=Mode.PRIVATE)
    chamfer2_piece_3a = split(chamfer2_piece_3a, bisect_by=Plane(origin=(-8.467911113762062, -2.7144247806268993, 2.105130613724074), z_dir=(0.42261826174069356, 0.9063077870366528, 0)), keep=Keep.TOP, mode=Mode.PRIVATE)
    with BuildSketch(Plane(origin=(-6.36268787947312, -3.696106496901656, 4.568094418300827), x_dir=(0.33809036708449836, 0.9242749779914556, 0.17723055251158967), z_dir=(-0.8186169306793458, 0.38172734387111207, -0.4291276683531757))) as chamfer2_piece_3b_section:
        Polygon((CHAMFER2_SIZE, -2e-17), (CHAMFER2_SIZE_2 * 0.196215621581, -CHAMFER2_SIZE_2 * 0.980560773459), (0, 0), align=None)
    chamfer2_piece_3b = extrude(amount=7.014923756891123, mode=Mode.PRIVATE)
    chamfer2_piece_3b = split(chamfer2_piece_3b, bisect_by=Plane(origin=(-6.36268787947312, -2, 4.568094418300827), z_dir=(0, -1, 0)), keep=Keep.TOP, mode=Mode.PRIVATE)
    chamfer2_piece_3b = split(chamfer2_piece_3b, bisect_by=Plane(origin=(-8.46791111376206, -2.714424780626905, 4.568094418300827), z_dir=(0.9063077870366527, -0.4226182617406935, 0)), keep=Keep.TOP, mode=Mode.PRIVATE)
    chamfer2_piece_3 = chamfer2_piece_3a & chamfer2_piece_3b
    add(chamfer2_piece_3)

    # Chamfer3
    # the kernel refuses this chamfer: 48, 25 mm, written as the material it takes off along each edge
    with BuildSketch(Plane(origin=(0.5510317235878048, 130.20443654107186, -13.145588768291852), x_dir=(0.9063077870366527, -0.4226182617406935, 0), z_dir=(-0.4226182617406935, -0.9063077870366527, 0))) as chamfer3_piece_1:
        Polygon((CHAMFER3_SIZE, 0), (7.36e-15, CHAMFER3_SIZE_2), (0, 0), align=None)
    extrude(amount=253.55393800912003, mode=Mode.SUBTRACT)

    # Chamfer4
    chamfer4_edges = [body_2.edges().sort_by_distance(p)[0] for p in [
        (-38.08744375902795, 5.580500528019885, 11.854411231708156),
    ]]
    chamfer(chamfer4_edges, length=CHAMFER4_SIZE)

    # Chamfer5
    chamfer5_edges = [body_2.edges().sort_by_distance(p)[0] for p in [
        (-53.87002677778143, 5.216394422394137, 14.854411231708154),
        (-28.22151640464415, -6.743702384867465, 14.854411231708154),
    ]]
    chamfer(chamfer5_edges, length=CHAMFER5_SIZE)


with BuildPart() as body_3:
    # Mirror1: mirrored copy
    add(body_2.part.mirror(Plane.ZX.offset(18.000000000000004)))


solid = Compound([part.part, body_2.part, body_3.part])
